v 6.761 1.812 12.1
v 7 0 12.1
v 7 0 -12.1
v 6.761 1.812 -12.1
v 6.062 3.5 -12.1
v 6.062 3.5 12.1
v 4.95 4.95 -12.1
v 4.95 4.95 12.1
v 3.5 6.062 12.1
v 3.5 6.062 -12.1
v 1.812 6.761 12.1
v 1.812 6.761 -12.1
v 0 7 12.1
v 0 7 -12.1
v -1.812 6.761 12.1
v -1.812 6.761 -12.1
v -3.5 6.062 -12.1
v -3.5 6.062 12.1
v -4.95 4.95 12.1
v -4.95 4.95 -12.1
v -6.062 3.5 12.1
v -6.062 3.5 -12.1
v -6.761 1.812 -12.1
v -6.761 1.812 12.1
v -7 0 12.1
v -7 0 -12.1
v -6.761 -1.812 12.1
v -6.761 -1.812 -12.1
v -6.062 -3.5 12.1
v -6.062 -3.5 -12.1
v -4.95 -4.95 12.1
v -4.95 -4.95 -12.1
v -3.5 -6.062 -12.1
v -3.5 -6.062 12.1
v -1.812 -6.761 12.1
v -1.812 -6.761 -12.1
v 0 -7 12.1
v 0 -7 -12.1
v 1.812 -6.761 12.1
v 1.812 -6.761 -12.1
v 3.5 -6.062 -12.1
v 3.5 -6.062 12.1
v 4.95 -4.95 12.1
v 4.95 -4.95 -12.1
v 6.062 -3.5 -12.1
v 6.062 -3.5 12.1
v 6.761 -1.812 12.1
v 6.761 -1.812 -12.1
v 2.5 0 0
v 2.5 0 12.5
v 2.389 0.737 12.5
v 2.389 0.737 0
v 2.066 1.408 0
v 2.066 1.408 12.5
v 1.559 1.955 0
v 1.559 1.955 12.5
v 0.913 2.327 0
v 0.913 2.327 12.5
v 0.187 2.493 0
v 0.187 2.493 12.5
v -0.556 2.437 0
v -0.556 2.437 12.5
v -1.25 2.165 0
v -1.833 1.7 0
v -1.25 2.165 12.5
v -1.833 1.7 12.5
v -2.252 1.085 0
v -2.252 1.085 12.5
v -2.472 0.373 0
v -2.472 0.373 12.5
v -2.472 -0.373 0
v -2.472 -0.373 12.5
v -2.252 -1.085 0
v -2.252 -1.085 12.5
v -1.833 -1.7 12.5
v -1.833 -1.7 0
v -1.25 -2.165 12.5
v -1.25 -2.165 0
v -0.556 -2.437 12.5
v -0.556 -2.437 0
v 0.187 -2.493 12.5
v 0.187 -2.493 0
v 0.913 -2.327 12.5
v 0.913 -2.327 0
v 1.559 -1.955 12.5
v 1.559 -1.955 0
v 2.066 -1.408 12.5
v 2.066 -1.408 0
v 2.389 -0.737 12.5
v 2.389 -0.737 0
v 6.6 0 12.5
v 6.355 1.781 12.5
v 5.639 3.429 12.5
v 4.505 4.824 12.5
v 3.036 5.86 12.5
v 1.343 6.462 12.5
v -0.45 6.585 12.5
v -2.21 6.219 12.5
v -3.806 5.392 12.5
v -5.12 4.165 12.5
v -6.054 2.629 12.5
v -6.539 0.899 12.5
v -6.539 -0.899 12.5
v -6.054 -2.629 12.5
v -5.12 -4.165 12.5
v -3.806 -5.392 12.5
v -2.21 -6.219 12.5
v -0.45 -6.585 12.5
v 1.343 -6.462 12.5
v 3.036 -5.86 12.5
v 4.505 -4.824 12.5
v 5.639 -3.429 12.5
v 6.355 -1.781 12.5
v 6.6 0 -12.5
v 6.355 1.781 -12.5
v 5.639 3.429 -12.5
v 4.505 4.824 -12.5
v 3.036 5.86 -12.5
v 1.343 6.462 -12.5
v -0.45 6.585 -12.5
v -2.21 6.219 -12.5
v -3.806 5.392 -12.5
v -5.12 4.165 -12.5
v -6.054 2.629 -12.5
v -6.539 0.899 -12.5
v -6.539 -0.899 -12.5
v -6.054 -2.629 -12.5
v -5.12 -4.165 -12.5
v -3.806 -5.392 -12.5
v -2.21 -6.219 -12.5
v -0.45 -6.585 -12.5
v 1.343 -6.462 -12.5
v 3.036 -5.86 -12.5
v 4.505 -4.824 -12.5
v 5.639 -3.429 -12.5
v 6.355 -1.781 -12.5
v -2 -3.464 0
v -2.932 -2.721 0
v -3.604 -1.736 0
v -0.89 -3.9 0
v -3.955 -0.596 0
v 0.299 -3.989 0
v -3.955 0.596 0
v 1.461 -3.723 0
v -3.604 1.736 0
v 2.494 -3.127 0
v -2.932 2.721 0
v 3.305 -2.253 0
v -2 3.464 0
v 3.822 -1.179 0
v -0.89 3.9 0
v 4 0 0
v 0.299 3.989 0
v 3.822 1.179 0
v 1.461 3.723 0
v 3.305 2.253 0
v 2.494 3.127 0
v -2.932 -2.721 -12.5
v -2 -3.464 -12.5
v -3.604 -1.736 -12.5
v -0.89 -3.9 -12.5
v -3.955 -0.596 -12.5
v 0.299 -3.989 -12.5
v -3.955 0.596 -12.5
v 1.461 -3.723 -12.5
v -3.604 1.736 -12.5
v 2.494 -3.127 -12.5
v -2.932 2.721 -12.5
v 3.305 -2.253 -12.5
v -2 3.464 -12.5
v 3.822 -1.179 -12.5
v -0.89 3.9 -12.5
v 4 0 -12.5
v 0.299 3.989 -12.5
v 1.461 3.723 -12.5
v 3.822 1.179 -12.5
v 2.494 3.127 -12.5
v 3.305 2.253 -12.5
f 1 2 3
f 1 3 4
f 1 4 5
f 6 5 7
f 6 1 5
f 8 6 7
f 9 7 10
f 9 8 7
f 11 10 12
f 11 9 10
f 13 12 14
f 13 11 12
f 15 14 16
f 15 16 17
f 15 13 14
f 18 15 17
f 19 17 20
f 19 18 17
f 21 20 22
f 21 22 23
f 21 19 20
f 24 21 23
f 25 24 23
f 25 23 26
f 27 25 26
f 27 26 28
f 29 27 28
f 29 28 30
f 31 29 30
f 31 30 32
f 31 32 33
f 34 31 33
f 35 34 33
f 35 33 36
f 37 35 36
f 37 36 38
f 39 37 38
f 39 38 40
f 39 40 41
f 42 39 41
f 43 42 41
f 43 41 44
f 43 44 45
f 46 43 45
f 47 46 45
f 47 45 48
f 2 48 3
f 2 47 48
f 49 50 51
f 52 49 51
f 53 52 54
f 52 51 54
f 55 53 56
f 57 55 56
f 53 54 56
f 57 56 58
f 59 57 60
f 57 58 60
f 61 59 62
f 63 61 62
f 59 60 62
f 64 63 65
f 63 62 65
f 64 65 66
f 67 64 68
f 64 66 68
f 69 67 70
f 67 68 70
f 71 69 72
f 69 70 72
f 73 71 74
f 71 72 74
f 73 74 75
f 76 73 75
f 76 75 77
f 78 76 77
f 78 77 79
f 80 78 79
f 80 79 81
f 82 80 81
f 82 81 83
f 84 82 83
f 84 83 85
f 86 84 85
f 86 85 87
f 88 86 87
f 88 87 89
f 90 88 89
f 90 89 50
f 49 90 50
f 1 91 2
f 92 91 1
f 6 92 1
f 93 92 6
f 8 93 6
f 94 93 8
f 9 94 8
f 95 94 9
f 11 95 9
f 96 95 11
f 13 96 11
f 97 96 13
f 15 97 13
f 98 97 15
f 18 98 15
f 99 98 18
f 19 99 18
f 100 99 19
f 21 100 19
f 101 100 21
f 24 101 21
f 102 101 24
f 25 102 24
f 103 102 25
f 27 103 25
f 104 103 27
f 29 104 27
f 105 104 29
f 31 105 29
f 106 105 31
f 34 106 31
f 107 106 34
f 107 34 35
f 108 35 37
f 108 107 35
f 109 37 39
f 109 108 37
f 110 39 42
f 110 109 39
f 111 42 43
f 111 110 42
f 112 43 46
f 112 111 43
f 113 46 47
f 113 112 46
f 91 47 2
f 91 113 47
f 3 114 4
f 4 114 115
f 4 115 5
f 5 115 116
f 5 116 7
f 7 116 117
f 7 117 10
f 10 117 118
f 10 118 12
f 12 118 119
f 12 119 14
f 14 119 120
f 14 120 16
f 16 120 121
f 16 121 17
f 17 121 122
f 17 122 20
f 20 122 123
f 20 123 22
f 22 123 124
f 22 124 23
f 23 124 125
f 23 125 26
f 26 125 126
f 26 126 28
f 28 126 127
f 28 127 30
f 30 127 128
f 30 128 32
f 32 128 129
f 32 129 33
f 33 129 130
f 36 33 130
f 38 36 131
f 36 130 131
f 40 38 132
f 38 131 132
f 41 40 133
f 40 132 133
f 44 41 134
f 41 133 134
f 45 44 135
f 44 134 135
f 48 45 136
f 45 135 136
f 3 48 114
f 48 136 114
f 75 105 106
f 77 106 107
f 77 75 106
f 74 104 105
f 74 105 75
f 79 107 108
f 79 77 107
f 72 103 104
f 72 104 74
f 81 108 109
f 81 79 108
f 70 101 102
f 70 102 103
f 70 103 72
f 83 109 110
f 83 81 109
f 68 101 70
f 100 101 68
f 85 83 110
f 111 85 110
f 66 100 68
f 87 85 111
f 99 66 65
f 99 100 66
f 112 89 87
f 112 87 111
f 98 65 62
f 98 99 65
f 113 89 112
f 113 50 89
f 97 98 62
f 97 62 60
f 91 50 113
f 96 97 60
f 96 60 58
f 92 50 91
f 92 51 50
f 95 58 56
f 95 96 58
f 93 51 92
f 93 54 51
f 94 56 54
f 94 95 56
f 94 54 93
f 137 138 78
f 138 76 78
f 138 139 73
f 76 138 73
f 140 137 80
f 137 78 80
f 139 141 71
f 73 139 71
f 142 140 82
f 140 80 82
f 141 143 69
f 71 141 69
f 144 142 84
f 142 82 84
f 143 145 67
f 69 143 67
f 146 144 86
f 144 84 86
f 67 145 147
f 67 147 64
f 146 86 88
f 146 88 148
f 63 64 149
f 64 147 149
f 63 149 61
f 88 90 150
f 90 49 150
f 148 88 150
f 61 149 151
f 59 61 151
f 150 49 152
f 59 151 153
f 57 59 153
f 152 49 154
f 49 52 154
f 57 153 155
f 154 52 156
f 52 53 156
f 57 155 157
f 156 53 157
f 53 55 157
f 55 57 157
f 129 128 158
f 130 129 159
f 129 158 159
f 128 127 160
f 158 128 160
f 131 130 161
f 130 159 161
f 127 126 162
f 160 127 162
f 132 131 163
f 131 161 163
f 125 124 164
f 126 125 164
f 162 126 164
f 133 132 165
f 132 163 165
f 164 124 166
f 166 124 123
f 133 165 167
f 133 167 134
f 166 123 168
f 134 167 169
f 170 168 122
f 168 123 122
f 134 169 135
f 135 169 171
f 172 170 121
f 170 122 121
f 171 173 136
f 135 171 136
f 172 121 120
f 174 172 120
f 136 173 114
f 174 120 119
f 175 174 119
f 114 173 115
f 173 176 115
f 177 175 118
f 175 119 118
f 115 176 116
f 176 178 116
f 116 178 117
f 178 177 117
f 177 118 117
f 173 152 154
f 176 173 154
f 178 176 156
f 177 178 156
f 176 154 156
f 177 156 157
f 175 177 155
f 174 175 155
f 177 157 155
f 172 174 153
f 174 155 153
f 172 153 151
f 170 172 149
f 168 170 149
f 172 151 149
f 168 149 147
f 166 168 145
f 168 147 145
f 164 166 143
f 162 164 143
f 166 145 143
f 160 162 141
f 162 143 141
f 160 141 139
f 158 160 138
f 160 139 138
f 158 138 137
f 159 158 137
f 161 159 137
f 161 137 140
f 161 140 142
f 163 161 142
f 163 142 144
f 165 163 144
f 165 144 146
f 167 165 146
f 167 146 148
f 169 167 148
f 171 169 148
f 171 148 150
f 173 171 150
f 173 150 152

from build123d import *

# Parameters (mm, degrees)
SKETCH1_R           = 7
BOSS_EXTRUDE1_DEPTH = 12.5
SKETCH2_R           = 2.5
CUT_EXTRUDE1_DEPTH  = 27.888659319
SKETCH3_R           = 4
CUT_EXTRUDE2_DEPTH  = 16.945218719
CHAMFER1_SIZE       = 0.4


with BuildPart() as part:
    # Sketch1 → Boss-Extrude1 (new, symmetric)
    with BuildSketch(Plane.XY):
        Circle(SKETCH1_R)
    extrude(amount=BOSS_EXTRUDE1_DEPTH, both=True)

    # Sketch2 → Cut-Extrude1 (cut, through all)
    with BuildSketch(Plane.XY.offset(12.5)):
        Circle(SKETCH2_R)
    extrude(amount=-CUT_EXTRUDE1_DEPTH, mode=Mode.SUBTRACT)

    # Sketch3 → Cut-Extrude2 (cut, through all)
    with BuildSketch(Plane.XY):
        Circle(SKETCH3_R)
    extrude(amount=-CUT_EXTRUDE2_DEPTH, mode=Mode.SUBTRACT)

    # Chamfer1
    chamfer1_edges = [part.edges().sort_by_distance(p)[0] for p in [
        (-7, 0, -12.5),
        (-7, 0, 12.5),
    ]]
    chamfer(chamfer1_edges, length=CHAMFER1_SIZE)


solid = part.part
